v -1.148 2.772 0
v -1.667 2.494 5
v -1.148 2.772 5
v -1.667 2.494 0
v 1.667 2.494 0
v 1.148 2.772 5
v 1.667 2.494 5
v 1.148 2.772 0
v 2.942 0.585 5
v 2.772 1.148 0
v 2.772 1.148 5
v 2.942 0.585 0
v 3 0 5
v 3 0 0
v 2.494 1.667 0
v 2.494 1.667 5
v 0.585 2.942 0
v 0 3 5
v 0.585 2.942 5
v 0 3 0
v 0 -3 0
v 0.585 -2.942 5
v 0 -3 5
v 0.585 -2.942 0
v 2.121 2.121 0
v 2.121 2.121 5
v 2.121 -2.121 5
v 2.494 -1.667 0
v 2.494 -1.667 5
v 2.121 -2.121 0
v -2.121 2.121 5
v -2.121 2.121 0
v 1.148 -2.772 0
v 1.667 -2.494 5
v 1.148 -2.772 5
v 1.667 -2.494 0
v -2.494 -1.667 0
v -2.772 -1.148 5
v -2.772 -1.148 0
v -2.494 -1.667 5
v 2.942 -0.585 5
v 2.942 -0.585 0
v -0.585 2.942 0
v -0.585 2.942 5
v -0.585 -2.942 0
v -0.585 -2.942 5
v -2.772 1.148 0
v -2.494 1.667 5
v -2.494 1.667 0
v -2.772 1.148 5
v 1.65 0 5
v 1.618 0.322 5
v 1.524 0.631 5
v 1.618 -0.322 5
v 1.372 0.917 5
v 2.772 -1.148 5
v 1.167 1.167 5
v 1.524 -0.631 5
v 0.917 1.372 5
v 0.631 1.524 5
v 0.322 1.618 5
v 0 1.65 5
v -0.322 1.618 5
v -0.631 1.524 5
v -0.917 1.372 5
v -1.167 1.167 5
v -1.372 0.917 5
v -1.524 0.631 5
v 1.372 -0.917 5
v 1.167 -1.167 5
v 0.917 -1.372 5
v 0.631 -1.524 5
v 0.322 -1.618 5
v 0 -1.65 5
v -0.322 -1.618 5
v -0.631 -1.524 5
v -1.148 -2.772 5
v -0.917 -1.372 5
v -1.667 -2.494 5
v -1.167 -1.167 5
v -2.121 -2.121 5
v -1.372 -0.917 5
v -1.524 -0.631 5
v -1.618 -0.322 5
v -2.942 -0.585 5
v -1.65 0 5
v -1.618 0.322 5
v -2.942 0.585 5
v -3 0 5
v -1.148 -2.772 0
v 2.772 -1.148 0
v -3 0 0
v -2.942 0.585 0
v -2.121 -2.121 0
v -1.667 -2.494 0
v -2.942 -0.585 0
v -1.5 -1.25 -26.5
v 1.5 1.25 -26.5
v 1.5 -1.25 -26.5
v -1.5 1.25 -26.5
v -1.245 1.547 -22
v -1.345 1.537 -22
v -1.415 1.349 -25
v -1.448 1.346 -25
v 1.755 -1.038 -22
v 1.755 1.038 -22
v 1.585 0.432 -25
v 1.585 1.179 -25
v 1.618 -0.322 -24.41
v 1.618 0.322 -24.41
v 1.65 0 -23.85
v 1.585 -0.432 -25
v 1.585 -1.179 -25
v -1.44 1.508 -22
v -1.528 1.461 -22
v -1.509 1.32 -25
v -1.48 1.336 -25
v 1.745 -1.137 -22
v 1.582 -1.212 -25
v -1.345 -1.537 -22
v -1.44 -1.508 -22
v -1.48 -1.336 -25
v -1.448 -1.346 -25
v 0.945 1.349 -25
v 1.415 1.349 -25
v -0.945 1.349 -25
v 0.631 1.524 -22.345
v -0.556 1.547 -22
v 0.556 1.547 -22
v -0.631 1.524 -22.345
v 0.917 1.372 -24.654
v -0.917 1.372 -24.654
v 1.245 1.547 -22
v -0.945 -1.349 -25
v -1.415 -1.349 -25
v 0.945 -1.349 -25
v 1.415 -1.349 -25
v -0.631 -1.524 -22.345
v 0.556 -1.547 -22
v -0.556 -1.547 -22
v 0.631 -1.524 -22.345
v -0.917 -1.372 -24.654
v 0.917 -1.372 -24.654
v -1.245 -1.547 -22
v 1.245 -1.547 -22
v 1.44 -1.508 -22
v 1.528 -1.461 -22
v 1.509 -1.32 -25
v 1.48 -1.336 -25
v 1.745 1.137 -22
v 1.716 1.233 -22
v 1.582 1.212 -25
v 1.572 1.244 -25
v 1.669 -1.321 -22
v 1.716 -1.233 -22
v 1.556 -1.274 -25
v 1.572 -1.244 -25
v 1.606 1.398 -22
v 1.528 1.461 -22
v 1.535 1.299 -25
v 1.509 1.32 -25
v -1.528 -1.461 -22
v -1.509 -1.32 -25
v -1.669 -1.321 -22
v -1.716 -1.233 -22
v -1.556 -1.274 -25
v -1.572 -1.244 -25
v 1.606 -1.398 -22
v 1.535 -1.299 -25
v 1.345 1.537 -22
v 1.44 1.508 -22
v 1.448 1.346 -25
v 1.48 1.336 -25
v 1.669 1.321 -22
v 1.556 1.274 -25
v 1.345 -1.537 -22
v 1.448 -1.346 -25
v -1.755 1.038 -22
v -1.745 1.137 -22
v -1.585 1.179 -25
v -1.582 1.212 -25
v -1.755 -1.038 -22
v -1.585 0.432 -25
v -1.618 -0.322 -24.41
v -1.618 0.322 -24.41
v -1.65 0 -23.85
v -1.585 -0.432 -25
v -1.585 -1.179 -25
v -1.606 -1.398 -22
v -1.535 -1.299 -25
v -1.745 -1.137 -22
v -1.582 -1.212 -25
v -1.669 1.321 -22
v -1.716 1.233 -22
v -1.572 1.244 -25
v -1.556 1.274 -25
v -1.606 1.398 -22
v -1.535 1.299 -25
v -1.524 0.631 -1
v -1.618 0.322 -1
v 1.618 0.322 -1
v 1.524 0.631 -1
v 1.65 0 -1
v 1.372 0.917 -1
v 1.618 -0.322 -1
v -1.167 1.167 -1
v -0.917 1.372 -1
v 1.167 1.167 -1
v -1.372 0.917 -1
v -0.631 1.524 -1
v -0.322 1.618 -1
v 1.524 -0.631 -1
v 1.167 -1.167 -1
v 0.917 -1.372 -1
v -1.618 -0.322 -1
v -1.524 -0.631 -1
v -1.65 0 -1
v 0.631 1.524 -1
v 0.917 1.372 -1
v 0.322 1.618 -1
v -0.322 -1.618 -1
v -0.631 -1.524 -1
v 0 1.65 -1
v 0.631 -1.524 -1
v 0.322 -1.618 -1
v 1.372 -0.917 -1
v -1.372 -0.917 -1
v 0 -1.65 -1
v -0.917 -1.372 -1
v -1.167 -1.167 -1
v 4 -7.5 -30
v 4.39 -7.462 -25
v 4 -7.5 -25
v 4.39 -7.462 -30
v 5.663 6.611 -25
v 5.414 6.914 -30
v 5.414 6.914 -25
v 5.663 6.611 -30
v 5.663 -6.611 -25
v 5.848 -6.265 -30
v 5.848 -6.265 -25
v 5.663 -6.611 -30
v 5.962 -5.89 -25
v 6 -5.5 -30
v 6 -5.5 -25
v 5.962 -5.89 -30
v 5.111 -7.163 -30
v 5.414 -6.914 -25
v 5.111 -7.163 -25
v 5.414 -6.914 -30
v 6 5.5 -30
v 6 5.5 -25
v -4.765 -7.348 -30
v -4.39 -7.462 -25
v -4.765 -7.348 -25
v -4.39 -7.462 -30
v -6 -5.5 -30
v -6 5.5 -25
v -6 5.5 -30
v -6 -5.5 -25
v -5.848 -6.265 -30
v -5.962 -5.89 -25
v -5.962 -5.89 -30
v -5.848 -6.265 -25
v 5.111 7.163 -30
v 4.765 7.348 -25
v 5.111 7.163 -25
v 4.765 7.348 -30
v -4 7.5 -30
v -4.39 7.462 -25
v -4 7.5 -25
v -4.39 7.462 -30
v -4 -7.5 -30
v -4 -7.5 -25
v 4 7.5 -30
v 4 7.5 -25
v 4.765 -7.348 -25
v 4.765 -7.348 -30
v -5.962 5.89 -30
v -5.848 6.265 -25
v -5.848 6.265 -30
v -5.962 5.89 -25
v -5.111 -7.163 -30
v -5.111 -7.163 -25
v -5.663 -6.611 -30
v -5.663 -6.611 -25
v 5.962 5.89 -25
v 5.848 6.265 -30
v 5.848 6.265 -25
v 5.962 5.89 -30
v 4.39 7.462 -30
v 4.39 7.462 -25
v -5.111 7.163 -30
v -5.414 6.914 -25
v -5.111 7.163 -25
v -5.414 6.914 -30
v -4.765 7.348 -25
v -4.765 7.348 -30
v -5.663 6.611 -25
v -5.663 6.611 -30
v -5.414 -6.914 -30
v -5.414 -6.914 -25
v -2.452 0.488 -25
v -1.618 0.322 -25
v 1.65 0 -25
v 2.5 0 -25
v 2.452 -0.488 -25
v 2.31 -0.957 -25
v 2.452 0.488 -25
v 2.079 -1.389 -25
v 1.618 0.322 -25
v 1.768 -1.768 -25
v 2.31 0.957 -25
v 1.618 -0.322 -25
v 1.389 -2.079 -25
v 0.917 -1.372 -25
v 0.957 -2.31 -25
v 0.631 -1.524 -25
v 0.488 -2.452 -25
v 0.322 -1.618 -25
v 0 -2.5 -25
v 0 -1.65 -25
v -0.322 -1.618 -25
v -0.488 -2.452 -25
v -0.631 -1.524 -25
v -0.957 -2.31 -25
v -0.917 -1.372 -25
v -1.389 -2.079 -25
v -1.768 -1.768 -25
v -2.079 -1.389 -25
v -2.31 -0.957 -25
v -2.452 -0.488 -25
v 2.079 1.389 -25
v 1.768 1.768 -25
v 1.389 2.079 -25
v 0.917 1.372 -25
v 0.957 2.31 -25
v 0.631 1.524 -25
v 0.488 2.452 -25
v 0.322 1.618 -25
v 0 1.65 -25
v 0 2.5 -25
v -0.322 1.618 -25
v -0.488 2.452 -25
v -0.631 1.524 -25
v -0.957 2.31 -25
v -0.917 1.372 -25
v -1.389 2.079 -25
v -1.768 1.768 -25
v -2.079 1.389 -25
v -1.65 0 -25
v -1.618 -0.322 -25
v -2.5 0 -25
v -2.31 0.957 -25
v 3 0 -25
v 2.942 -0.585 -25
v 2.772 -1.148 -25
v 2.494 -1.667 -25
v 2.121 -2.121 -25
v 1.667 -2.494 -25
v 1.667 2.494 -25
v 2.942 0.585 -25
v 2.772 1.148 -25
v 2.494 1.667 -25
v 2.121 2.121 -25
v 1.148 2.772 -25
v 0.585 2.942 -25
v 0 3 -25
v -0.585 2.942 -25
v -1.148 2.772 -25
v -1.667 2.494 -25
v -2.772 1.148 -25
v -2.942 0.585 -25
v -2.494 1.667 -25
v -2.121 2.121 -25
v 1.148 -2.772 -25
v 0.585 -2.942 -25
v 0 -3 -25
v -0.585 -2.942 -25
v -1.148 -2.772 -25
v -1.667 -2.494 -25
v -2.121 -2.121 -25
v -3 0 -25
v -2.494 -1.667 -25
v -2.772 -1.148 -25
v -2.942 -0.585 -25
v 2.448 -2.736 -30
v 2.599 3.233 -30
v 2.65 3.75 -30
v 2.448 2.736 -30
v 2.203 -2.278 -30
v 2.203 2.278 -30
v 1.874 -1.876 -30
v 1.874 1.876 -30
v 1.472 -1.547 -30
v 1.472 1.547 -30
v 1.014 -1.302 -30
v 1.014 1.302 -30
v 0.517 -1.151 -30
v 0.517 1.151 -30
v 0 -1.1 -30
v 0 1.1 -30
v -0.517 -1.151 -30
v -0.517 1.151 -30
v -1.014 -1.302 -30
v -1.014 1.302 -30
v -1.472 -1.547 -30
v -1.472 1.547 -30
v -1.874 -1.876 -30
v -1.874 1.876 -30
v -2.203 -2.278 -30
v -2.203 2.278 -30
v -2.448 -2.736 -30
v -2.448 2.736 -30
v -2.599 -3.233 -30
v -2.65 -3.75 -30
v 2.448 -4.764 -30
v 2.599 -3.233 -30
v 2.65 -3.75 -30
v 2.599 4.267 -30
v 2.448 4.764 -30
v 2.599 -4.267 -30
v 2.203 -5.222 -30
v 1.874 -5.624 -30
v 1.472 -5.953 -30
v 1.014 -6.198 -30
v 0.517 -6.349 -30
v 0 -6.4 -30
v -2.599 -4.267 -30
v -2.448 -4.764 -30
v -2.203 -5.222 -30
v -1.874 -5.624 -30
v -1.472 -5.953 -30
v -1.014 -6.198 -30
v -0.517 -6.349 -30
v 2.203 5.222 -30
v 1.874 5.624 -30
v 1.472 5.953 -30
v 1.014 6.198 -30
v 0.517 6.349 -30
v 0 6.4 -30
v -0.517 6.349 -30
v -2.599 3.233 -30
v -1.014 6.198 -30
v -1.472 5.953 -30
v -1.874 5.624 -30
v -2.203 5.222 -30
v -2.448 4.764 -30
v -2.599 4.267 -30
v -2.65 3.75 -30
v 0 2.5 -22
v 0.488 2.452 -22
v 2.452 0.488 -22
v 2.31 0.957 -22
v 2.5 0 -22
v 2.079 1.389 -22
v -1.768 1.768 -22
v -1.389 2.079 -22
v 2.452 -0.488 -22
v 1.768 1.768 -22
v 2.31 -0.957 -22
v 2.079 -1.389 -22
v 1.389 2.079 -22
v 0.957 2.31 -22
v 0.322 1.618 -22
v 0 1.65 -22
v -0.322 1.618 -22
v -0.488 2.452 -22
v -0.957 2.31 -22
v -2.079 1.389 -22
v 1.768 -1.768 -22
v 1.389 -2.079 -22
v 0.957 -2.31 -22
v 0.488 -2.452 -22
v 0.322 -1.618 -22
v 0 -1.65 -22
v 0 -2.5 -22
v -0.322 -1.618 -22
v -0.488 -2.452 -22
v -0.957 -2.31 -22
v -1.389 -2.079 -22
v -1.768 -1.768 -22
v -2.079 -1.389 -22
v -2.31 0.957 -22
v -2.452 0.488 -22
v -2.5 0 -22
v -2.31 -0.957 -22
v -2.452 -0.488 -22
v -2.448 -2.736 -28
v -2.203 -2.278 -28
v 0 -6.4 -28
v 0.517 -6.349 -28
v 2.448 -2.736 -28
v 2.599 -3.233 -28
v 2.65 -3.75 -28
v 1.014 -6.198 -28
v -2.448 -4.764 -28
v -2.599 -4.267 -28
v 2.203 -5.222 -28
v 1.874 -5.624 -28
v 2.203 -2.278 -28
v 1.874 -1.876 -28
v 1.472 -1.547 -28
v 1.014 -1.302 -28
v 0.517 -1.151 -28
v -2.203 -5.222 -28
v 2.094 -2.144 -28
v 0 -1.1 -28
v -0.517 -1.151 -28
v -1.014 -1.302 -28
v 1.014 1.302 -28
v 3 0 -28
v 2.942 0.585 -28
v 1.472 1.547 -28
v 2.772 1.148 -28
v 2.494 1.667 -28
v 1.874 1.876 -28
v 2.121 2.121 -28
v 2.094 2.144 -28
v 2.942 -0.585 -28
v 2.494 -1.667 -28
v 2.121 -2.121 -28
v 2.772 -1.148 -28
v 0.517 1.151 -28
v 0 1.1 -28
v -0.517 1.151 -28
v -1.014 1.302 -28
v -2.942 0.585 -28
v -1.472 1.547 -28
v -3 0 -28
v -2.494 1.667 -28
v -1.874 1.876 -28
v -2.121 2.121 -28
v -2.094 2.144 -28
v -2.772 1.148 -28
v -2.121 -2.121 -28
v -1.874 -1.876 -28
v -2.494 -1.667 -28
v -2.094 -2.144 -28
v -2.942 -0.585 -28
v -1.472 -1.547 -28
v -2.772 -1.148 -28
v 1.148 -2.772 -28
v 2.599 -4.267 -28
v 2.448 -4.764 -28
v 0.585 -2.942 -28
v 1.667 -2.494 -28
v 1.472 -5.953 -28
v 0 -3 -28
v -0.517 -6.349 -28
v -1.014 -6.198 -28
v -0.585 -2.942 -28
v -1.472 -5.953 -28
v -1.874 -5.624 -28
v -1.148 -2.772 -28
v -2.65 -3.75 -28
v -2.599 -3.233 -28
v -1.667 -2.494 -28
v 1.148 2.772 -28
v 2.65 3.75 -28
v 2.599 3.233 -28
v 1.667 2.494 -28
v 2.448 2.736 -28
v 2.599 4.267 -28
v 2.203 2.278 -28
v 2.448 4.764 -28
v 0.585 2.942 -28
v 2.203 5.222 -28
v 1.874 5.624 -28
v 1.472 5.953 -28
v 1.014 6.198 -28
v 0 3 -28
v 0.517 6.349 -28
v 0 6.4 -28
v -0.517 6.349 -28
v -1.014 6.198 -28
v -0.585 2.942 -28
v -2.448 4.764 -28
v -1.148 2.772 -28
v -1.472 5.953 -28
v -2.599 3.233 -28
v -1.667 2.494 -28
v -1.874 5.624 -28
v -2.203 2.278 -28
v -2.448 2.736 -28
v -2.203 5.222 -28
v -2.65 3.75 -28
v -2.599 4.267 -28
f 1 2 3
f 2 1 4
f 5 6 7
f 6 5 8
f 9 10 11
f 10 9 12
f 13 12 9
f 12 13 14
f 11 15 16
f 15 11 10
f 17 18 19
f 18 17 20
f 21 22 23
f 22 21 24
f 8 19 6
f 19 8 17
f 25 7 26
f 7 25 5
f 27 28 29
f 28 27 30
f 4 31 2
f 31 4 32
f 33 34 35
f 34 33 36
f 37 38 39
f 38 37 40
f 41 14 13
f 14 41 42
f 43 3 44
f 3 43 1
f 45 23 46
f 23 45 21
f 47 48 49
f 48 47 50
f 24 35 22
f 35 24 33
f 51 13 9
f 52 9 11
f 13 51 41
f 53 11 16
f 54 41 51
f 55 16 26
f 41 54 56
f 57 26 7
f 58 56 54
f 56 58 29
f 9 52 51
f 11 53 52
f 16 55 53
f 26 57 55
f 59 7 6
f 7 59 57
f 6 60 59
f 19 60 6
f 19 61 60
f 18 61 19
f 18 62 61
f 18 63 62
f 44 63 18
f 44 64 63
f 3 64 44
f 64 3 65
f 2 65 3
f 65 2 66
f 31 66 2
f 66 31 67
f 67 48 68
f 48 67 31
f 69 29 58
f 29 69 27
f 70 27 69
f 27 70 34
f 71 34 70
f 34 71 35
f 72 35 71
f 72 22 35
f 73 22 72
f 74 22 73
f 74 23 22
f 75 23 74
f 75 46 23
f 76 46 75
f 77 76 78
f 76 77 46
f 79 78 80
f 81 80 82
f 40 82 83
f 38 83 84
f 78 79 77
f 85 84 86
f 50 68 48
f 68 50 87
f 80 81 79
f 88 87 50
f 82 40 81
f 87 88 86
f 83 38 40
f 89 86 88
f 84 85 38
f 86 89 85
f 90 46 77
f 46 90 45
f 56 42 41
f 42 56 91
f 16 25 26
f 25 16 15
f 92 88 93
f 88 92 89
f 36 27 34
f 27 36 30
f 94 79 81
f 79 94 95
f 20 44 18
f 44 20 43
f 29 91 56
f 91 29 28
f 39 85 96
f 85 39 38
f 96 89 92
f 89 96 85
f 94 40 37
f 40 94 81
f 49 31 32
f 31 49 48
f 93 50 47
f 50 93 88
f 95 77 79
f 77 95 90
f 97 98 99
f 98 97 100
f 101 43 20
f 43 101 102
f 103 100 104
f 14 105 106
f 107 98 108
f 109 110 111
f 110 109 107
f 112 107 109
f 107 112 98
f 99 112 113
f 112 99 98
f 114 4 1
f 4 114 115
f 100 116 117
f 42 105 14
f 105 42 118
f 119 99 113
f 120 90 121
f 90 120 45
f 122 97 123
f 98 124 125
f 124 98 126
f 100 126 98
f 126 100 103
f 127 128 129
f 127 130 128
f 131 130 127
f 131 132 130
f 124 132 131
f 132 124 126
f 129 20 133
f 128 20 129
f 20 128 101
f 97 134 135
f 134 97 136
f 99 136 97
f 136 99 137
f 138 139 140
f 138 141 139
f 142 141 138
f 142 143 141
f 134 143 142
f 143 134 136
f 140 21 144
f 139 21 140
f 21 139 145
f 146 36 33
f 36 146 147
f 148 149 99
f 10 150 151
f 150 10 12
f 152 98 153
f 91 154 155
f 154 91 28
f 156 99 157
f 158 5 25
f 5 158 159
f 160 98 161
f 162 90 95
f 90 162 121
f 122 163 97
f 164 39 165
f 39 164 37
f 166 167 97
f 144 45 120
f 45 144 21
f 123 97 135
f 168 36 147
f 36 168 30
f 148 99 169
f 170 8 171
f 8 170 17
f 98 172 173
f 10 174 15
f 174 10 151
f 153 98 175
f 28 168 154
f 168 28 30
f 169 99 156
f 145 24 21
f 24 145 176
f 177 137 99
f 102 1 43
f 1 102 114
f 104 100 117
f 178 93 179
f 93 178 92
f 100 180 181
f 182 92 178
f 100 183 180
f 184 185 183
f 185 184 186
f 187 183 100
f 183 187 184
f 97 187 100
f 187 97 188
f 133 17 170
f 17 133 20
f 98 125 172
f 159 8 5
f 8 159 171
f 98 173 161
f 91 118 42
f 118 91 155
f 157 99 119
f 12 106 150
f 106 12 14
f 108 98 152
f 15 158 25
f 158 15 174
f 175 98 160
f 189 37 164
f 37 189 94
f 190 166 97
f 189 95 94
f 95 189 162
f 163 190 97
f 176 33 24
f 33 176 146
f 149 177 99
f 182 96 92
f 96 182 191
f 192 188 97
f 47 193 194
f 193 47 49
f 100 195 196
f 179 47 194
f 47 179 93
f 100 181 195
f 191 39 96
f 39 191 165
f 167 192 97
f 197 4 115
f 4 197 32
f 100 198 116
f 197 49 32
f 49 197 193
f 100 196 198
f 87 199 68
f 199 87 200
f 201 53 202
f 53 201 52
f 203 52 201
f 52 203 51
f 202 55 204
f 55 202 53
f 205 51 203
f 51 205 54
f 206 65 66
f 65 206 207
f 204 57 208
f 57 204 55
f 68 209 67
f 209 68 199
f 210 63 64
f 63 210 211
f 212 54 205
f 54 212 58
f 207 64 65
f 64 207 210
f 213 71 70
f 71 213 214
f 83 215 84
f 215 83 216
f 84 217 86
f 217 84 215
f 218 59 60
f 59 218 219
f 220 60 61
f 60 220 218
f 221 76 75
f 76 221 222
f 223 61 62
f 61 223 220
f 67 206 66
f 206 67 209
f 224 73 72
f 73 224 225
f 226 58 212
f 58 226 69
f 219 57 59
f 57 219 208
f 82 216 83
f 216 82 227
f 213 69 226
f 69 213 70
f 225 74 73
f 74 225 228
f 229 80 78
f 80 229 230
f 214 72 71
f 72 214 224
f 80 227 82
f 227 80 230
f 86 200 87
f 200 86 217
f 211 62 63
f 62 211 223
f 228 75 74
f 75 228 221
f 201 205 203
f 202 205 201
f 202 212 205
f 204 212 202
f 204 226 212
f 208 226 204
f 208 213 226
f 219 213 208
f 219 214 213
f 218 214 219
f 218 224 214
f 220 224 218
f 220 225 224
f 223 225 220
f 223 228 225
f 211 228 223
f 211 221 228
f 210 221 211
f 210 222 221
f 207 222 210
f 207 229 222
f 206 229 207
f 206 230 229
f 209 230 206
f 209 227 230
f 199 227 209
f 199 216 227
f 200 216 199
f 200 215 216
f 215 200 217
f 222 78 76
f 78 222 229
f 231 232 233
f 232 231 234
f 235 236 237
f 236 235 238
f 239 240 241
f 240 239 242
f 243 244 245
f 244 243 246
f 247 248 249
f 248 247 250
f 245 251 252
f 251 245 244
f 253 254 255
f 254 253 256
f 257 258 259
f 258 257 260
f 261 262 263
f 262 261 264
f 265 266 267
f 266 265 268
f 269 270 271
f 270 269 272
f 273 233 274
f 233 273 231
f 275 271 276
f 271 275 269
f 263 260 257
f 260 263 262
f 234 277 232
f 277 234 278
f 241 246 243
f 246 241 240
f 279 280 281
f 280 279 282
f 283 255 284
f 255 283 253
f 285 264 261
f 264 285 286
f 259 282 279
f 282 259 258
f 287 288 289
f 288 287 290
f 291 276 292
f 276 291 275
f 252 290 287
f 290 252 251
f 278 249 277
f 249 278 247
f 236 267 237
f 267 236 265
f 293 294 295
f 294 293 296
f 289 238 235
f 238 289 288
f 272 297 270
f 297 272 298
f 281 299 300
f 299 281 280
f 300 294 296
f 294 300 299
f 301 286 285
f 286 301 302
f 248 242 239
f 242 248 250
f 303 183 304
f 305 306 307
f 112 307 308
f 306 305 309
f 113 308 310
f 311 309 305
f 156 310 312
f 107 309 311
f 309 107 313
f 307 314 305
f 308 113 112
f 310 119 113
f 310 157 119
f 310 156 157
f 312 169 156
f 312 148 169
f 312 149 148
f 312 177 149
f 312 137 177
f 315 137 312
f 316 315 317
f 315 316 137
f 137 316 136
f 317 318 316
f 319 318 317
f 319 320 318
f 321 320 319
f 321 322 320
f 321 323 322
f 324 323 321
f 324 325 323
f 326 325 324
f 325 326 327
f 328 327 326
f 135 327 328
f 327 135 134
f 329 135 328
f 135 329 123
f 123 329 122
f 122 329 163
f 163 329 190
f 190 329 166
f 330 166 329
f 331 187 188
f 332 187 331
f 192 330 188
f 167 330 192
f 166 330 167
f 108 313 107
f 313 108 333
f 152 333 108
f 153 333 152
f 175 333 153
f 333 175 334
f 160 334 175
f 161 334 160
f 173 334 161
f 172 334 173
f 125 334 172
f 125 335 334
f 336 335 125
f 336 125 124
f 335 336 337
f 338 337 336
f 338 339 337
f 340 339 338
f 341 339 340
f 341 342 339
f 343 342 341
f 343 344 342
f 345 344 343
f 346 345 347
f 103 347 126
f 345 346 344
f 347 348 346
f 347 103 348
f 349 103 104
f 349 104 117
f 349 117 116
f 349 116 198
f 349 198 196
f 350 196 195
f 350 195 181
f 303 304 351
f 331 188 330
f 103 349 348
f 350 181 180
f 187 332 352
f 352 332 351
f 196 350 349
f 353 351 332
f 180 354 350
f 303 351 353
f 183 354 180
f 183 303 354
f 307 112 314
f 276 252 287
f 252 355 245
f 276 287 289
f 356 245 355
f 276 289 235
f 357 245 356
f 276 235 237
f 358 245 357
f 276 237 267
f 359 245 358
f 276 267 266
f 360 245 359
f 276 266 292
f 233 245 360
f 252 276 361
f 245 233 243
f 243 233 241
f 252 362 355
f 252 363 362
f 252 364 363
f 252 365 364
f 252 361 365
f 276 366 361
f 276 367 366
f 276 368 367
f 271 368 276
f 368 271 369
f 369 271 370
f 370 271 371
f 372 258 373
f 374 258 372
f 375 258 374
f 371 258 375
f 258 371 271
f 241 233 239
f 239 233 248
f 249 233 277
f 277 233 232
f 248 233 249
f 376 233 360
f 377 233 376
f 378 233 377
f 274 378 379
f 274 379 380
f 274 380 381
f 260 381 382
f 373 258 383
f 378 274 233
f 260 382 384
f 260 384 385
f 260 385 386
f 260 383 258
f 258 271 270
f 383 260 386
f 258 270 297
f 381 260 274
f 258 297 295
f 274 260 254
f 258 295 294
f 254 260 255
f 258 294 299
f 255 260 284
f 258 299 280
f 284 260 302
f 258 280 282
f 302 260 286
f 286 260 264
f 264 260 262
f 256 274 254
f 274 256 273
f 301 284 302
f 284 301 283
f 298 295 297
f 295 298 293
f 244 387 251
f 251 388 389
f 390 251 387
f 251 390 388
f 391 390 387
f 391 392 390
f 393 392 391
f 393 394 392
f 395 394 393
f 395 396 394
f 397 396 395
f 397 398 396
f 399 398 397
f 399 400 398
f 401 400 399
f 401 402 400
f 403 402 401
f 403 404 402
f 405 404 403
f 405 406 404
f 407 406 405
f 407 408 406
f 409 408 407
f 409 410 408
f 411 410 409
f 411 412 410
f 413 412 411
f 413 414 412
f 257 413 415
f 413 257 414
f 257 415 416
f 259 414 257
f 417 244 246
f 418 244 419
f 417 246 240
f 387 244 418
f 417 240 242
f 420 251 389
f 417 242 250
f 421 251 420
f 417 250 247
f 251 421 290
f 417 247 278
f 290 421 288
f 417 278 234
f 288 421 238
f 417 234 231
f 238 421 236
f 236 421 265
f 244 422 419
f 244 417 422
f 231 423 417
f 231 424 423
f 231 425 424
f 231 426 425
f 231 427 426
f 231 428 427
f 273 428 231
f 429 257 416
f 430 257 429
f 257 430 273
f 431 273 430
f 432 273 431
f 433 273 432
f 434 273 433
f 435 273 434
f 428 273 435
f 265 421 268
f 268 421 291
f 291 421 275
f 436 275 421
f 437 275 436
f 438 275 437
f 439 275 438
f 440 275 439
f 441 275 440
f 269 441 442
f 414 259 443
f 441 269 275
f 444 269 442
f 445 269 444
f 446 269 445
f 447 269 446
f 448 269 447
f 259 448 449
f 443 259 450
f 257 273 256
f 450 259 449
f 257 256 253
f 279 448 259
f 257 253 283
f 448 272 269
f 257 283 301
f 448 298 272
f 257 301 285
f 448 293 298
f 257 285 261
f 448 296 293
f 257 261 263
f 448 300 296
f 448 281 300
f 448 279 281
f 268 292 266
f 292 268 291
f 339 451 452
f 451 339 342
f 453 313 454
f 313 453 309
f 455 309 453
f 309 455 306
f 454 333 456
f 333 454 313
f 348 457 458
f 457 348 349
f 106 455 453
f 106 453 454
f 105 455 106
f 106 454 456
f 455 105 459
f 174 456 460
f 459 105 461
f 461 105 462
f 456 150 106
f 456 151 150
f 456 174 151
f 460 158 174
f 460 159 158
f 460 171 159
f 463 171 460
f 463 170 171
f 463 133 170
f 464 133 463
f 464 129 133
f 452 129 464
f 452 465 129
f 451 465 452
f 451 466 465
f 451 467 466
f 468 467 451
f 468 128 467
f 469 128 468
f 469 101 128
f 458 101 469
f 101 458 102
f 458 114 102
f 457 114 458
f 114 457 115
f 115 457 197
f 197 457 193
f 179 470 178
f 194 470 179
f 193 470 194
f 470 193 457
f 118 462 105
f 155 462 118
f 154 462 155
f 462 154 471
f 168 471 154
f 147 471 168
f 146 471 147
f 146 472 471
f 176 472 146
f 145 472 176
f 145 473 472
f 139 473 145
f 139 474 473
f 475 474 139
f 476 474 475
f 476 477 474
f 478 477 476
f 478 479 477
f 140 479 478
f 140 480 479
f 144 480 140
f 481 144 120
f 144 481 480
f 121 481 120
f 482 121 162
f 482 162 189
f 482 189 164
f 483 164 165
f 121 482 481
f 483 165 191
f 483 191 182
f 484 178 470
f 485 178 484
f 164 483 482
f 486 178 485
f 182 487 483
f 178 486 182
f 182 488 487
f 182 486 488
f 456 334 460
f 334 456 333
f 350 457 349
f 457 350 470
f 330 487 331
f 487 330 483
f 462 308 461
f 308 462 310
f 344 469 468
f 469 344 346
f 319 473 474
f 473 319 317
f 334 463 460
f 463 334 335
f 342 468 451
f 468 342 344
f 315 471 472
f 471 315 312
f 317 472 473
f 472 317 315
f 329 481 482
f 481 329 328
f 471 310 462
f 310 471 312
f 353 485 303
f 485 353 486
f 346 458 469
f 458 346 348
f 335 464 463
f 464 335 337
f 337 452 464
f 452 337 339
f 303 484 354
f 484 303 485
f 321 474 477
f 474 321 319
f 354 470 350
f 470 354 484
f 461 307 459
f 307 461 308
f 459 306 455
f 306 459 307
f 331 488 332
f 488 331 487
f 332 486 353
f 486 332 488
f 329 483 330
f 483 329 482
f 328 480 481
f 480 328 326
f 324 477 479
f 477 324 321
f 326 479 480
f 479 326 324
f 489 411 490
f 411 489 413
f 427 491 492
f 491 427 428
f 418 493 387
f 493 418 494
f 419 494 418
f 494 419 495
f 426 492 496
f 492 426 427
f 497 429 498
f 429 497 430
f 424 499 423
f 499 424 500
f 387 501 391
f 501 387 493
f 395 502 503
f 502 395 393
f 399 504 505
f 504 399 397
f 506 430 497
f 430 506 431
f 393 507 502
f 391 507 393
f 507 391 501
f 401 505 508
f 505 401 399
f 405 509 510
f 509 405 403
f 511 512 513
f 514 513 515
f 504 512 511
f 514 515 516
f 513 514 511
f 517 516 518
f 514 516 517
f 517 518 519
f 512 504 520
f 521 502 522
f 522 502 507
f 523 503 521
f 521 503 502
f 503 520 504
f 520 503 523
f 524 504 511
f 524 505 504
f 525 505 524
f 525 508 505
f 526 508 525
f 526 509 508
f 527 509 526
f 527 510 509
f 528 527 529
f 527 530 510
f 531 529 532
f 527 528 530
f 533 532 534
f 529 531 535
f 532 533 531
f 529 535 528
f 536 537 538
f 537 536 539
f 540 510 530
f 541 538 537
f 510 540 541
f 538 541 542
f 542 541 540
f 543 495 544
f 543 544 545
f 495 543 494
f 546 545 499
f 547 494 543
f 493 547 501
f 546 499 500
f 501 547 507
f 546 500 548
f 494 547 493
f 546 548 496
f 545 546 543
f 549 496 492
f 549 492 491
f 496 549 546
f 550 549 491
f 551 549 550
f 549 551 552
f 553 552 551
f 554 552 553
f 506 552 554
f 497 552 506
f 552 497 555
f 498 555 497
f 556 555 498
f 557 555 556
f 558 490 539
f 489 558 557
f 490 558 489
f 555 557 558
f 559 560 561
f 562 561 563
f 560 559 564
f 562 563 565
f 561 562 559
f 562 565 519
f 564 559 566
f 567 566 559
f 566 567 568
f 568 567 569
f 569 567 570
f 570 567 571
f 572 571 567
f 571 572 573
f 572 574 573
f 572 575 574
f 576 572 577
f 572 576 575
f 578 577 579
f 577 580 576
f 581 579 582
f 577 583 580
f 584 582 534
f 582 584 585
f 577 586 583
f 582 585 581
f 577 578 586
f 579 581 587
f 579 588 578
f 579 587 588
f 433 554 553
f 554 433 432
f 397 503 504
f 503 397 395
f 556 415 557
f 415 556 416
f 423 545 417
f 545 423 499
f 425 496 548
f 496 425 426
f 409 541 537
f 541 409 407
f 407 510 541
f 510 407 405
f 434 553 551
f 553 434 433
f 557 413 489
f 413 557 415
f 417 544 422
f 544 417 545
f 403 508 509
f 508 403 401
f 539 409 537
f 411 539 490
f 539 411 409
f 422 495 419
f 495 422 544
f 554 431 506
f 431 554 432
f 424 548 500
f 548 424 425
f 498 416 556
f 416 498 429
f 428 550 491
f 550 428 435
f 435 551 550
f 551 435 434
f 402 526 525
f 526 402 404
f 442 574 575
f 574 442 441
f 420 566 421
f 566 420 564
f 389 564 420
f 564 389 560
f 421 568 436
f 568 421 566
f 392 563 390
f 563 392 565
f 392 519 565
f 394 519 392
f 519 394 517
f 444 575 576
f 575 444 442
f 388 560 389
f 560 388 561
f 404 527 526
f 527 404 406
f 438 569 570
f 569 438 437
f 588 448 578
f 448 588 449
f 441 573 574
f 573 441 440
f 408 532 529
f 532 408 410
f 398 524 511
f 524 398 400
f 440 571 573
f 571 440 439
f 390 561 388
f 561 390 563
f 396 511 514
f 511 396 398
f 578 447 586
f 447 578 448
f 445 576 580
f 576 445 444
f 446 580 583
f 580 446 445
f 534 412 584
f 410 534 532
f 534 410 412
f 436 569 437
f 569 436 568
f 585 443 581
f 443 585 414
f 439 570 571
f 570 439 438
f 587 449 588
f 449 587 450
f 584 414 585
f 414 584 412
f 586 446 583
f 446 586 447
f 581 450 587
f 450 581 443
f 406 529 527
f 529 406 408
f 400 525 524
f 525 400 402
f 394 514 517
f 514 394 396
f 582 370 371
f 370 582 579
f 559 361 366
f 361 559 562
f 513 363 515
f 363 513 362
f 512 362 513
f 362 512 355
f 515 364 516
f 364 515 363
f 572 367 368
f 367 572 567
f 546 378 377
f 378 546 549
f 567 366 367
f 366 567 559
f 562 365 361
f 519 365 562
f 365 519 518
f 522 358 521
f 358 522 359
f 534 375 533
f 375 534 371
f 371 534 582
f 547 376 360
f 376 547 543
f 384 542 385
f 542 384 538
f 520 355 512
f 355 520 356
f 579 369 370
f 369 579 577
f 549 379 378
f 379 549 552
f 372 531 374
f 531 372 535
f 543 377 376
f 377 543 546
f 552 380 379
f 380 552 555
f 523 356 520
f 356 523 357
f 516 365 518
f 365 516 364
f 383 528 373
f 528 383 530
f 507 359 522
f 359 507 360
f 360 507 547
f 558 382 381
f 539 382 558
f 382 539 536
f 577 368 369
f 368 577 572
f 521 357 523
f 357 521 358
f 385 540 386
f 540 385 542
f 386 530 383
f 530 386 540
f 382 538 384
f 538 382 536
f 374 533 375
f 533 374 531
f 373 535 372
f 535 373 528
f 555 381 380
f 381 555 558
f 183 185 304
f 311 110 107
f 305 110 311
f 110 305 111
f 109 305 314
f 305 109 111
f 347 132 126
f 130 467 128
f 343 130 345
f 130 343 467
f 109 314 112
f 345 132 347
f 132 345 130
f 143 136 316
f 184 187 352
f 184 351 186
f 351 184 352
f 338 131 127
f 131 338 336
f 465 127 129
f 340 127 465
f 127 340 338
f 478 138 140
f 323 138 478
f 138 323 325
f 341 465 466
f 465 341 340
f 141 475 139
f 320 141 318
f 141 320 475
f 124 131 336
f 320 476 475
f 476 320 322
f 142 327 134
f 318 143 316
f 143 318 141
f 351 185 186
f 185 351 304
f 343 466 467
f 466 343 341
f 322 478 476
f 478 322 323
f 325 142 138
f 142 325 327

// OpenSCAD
// file: config.scad
// ============================================
// NuiBone - 共通設定ファイル
// ============================================
// 15cmぬいぐるみ用ロボット骨格の寸法設定
// ============================================

// --- ぬいぐるみサイズ制約 ---
nui_height = 150;        // ぬいぐるみ全高 (mm)
nui_body_width = 40;     // 胴体最大幅 (mm)
nui_body_depth = 25;     // 胴体最大厚み (mm)

// --- 骨格寸法 ---
bone_thickness = 2.5;    // 骨格基本厚み (mm)
bone_width = 3;          // 骨格基本幅 (mm)

// 胴体フレーム
body_height = 45;        // 胴体高さ (mm)
body_width = 35;         // 胴体幅 (mm)
body_depth = 20;         // 胴体奥行き (mm)

// 肩
shoulder_width = 8;      // 肩部品幅 (mm)
shoulder_offset = 15;    // 肩の高さ位置（胴体上端から）

// 腕
arm_length = 35;         // 腕の長さ (mm)
arm_width = 4;           // 腕の幅 (mm)
arm_thickness = 2;       // 腕の厚み (mm)

// 足
foot_width = 12;         // 足幅 (mm)
foot_length = 15;        // 足長さ (mm)
foot_height = 5;         // 足高さ (mm)
leg_length = 30;         // 脚の長さ (mm)

// --- SG90サーボ寸法 ---
sg90_width = 12.2;       // サーボ幅 (mm)
sg90_height = 22.5;      // サーボ高さ (mm)
sg90_depth = 22.5;       // サーボ奥行き (mm)
sg90_shaft_height = 4;   // 出力軸高さ (mm)
sg90_shaft_dia = 4.8;    // 出力軸直径 (mm)
sg90_mount_hole = 2;     // 取付穴径 (mm)
sg90_mount_dist = 28;    // 取付穴間距離 (mm)
sg90_flange_width = 32.5; // フランジ幅 (mm)
sg90_flange_thick = 2.5; // フランジ厚み (mm)

// --- 磁石・重り ---
magnet_dia = 5;          // ネオジム磁石直径 (mm)
magnet_height = 2;       // ネオジム磁石高さ (mm)
weight_hole_dia = 6;     // 重り穴直径 (mm)

// --- 呼吸機構 ---
breath_stroke = 3;       // 呼吸ストローク (mm)
breath_plate_size = 15;  // 呼吸プレートサイズ (mm)

// --- 印刷設定 ---
wall_thick = 1.2;        // 壁厚み (mm)
tolerance = 0.3;         // 組み立て公差 (mm)
$fn = 32;                // 円の分割数

// --- 色設定（プレビュー用）---
color_bone = [0.9, 0.9, 0.85];
color_servo = [0.2, 0.2, 0.3];
color_magnet = [0.7, 0.7, 0.7];
// main file
// ============================================
// NuiBone - 足パーツ
// ============================================
// 磁石と重りを内蔵して直立を補助
// ============================================

include <config.scad>

// --- 足アセンブリ ---
module foot_assembly() {
    // 脚部
    leg_bone();

    // 足裏
    translate([0, 0, -leg_length])
        foot_base();
}

// --- 脚ボーン ---
module leg_bone() {
    difference() {
        union() {
            // 股関節接続部
            cylinder(h=5, d=6);

            // 脚本体
            hull() {
                cylinder(h=3, d=6);
                translate([0, 0, -leg_length + foot_height])
                    cube([bone_width, bone_thickness, 3], center=true);
            }
        }

        // 股関節穴
        translate([0, 0, -1])
            cylinder(h=8, d=3 + tolerance);
    }
}

// --- 足裏ベース ---
module foot_base() {
    magnet_count = 2;  // 片足あたりの磁石数

    difference() {
        union() {
            // 足裏本体
            hull() {
                translate([-foot_width/2 + 2, -foot_length/2 + 2, 0])
                    cylinder(h=foot_height, r=2);
                translate([foot_width/2 - 2, -foot_length/2 + 2, 0])
                    cylinder(h=foot_height, r=2);
                translate([-foot_width/2 + 2, foot_length/2 - 2, 0])
                    cylinder(h=foot_height, r=2);
                translate([foot_width/2 - 2, foot_length/2 - 2, 0])
                    cylinder(h=foot_height, r=2);
            }

            // 脚接続ボス
            translate([0, 0, foot_height])
                cylinder(h=3, d=bone_width + 2);
        }

        // 磁石穴（前後に2個）
        for (y = [-foot_length/4, foot_length/4]) {
            translate([0, y, -0.5])
                cylinder(h=magnet_height + 0.5, d=magnet_dia + tolerance);
        }

        // 重り穴（中央）
        translate([0, 0, magnet_height])
            cylinder(h=foot_height - magnet_height, d=weight_hole_dia);

        // 脚接続穴
        translate([0, 0, foot_height - 1])
            cylinder(h=5, d=bone_width + tolerance);
    }
}

// --- 重りキャップ ---
// 重りを入れた後に蓋をする
module weight_cap() {
    difference() {
        cylinder(h=1.5, d=weight_hole_dia + 2);
        translate([0, 0, 0.5])
            cylinder(h=1.5, d=weight_hole_dia - 1);
    }
}

// --- 磁石固定リング ---
// 磁石を押さえるリング（オプション）
module magnet_retainer() {
    difference() {
        cylinder(h=1, d=magnet_dia + 3);
        translate([0, 0, -0.5])
            cylinder(h=2, d=magnet_dia + tolerance);
    }
}

// --- 足全体（左右セット）---
module feet_pair() {
    // 左足
    foot_assembly();

    // 右足（ミラー）
    translate([foot_width + 10, 0, 0])
        mirror([1, 0, 0])
            foot_assembly();
}

// --- 印刷用パーツ展開 ---
module foot_parts_for_print() {
    // 左脚
    translate([0, 0, leg_length])
        leg_bone();

    // 右脚
    translate([15, 0, leg_length])
        leg_bone();

    // 左足裏
    translate([30, 0, 0])
        foot_base();

    // 右足裏
    translate([50, 0, 0])
        foot_base();

    // 重りキャップ × 2
    translate([70, 0, 0])
        weight_cap();
    translate([80, 0, 0])
        weight_cap();
}

// --- メイン出力 ---
foot_assembly();

// 印刷用（コメントアウトで切替）
// foot_parts_for_print();

// 左右ペア表示
// feet_pair();
